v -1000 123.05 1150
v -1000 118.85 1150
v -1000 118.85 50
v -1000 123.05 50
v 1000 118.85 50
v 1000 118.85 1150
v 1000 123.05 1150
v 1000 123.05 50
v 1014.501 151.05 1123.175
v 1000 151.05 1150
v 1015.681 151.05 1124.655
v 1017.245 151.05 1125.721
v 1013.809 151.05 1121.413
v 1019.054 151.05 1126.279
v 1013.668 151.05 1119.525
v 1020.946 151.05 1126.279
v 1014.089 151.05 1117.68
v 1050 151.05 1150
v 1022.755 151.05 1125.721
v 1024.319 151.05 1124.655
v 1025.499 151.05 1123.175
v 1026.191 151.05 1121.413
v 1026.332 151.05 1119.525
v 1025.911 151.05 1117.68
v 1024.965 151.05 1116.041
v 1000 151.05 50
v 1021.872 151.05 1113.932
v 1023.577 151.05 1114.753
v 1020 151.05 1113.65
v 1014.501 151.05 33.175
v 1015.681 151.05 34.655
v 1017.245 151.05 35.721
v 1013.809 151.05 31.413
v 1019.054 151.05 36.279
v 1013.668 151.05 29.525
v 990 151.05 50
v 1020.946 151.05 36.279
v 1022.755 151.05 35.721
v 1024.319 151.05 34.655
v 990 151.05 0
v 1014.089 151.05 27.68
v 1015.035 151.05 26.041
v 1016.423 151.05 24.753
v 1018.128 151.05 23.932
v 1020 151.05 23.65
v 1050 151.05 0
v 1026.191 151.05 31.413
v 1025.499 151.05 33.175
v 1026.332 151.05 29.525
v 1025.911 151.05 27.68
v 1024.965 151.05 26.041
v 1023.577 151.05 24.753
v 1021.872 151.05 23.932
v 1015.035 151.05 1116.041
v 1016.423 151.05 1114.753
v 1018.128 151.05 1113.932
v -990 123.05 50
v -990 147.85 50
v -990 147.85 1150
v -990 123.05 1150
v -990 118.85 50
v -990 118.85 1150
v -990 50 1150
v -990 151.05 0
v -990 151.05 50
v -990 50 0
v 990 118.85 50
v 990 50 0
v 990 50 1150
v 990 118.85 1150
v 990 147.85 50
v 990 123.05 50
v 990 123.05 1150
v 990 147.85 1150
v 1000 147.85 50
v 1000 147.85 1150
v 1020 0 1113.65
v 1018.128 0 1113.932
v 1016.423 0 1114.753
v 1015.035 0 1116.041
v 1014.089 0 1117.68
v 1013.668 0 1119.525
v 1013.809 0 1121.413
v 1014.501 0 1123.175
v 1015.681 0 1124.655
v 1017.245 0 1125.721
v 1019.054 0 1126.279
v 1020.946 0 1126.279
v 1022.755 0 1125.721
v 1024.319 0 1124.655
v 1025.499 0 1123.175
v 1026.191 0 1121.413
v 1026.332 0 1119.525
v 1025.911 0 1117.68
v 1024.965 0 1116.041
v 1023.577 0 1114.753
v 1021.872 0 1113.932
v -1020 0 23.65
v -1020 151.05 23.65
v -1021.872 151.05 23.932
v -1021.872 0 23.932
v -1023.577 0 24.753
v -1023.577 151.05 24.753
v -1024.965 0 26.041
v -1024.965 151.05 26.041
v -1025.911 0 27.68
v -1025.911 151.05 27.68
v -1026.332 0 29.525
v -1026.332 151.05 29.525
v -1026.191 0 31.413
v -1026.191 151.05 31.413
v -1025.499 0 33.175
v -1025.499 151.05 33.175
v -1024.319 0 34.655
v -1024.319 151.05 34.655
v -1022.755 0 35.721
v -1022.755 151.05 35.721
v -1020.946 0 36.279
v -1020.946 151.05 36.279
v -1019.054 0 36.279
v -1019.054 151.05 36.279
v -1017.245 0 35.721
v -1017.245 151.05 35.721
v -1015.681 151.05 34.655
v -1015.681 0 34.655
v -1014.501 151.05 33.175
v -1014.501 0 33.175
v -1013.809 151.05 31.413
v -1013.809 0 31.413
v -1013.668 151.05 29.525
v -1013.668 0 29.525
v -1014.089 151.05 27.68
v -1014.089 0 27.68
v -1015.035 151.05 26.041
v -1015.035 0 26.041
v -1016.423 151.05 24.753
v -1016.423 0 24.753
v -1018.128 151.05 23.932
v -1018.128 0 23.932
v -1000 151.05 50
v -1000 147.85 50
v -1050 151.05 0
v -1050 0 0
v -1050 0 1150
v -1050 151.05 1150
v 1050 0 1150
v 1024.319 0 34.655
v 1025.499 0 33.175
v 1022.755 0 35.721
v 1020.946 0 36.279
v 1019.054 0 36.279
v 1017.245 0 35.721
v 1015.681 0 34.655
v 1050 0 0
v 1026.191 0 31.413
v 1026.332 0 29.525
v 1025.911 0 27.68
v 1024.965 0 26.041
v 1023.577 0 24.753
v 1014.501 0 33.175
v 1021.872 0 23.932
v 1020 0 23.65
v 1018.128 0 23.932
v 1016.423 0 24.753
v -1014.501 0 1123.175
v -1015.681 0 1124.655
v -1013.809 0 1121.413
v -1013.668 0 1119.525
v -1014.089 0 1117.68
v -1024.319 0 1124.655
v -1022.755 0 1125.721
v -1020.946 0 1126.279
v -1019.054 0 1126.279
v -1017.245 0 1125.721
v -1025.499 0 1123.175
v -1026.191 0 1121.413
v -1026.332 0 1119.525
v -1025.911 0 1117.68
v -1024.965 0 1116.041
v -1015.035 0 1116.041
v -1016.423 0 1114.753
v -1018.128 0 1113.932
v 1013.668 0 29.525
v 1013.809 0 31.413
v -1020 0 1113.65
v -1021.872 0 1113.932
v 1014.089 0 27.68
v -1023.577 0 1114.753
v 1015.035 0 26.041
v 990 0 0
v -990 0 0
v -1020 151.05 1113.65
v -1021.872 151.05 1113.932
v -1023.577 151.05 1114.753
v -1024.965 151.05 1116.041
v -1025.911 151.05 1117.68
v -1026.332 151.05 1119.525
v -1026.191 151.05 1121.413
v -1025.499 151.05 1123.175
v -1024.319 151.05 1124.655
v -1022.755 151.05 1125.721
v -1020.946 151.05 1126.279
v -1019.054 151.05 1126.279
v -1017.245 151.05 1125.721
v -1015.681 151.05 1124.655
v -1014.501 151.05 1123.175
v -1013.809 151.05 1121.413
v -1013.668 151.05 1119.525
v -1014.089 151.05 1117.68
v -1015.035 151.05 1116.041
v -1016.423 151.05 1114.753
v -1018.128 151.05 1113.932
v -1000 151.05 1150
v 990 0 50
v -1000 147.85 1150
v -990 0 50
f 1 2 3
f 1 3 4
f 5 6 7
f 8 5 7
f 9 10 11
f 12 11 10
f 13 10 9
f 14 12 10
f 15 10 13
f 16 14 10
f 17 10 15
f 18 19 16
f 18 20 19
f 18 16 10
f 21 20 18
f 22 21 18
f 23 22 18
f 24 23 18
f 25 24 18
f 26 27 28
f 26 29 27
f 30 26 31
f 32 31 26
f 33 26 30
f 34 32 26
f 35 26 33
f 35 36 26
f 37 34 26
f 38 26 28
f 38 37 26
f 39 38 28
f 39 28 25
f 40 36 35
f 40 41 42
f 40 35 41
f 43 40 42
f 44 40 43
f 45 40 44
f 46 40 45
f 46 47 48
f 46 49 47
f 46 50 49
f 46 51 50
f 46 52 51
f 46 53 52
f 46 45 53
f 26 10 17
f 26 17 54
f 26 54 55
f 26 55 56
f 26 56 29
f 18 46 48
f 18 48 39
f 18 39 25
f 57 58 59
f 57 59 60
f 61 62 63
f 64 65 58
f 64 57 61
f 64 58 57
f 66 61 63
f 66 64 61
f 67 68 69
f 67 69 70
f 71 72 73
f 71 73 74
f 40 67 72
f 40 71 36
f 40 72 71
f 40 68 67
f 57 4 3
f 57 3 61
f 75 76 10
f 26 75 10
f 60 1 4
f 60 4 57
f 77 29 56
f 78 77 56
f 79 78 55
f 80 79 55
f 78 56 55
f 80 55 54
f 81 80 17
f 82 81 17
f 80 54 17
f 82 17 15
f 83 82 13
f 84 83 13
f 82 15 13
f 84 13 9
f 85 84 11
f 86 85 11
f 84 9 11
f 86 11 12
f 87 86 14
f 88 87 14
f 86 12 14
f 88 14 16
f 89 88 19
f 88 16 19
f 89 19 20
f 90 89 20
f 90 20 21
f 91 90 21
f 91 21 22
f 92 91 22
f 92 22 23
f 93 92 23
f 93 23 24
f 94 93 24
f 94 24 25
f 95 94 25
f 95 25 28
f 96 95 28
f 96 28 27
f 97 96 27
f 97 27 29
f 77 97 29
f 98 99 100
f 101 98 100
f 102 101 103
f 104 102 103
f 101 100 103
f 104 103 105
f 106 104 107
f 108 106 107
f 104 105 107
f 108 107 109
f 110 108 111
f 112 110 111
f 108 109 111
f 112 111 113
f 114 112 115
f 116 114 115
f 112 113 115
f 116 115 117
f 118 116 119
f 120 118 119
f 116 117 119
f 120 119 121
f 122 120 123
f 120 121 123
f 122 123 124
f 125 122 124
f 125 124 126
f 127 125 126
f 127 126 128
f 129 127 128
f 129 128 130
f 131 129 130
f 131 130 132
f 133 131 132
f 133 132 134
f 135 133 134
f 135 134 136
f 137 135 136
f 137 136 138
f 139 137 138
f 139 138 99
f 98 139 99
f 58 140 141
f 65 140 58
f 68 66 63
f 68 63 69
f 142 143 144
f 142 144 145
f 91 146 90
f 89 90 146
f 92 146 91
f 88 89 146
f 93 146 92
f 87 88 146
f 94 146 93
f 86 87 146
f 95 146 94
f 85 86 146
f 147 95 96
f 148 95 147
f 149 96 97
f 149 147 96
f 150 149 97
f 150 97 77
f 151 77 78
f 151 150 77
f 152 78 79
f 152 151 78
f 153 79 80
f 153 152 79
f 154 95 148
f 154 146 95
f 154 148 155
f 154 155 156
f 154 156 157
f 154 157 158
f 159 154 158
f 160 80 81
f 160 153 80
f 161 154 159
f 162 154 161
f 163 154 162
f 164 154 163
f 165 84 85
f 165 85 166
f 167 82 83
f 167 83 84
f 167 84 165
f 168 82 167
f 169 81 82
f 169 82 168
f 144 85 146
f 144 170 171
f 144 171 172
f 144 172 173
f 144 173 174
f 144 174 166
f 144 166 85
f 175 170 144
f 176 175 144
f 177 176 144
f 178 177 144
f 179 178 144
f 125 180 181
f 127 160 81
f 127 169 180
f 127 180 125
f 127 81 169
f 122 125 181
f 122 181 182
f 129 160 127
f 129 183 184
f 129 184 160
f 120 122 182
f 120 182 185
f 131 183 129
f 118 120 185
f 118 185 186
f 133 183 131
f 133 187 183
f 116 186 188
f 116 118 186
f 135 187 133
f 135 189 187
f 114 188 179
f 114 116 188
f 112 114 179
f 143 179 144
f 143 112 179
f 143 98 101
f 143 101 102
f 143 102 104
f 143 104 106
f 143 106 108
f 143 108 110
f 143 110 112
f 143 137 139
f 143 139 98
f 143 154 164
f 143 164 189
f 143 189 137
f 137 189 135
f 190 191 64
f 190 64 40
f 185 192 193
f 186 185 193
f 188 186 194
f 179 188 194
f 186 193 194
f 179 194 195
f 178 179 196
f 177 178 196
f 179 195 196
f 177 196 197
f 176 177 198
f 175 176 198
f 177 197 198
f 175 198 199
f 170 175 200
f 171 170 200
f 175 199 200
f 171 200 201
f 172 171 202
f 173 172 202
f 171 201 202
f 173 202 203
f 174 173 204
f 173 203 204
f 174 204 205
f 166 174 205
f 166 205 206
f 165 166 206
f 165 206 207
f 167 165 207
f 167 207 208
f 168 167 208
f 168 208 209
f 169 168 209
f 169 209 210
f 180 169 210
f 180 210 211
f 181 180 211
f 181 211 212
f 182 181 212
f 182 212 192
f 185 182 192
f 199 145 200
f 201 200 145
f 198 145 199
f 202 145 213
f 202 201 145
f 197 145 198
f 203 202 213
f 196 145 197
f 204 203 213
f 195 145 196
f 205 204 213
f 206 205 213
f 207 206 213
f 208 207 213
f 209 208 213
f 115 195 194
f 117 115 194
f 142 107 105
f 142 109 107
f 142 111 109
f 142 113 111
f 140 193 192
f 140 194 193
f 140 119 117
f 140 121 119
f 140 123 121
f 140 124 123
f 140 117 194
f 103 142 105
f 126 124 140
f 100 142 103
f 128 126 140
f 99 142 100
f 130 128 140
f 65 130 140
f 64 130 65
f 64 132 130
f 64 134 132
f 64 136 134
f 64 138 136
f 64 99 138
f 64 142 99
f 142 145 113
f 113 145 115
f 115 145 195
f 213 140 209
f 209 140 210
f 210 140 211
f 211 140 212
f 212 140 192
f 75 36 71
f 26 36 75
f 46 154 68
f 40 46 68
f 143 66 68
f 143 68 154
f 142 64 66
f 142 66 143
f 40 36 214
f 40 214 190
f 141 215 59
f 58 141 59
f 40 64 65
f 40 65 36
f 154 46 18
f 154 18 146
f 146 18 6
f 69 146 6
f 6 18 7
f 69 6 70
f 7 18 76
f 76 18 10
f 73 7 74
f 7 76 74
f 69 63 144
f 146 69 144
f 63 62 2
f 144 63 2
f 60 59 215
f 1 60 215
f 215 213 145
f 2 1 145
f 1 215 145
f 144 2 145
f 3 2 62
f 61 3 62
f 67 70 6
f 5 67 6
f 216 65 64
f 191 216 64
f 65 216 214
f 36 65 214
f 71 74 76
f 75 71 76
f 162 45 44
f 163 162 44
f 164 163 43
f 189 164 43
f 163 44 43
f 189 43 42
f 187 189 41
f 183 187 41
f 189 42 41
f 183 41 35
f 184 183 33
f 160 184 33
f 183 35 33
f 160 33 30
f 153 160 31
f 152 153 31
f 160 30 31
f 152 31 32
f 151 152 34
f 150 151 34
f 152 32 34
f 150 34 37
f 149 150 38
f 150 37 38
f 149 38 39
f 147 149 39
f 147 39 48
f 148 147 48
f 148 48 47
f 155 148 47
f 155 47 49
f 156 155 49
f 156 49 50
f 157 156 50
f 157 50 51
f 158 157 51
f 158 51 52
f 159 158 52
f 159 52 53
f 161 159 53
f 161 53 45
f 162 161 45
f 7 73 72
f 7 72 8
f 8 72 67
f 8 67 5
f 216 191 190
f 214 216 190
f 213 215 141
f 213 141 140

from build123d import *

# Parameters (mm, degrees)
BOSS_EXTRUDE1_DEPTH = 1150
SKETCH4_W           = 1980
SKETCH4_H           = 50
BOSS_EXTRUDE2_DEPTH = 151.05
CUT_EXTRUDE2_START  = 1150
SKETCH6_W           = 2000
SKETCH6_H           = 3.2
SKETCH6_H_2         = 4.2
CUT_EXTRUDE2_DEPTH  = 1100
CUT_EXTRUDE3_START  = 151.05
SKETCH7_R           = 6.35
CUT_EXTRUDE3_DEPTH  = 1716.599808252


with BuildPart() as part:
    # Sketch3 → Boss-Extrude1 (new body)
    with BuildSketch(Plane.XY):
        Polygon((-990, 50), (990, 50), (990, 151.05), (1050, 151.05), (1050, 0), (-1050, 0), (-1050, 151.05), (-990, 151.05), align=None)
    extrude(amount=BOSS_EXTRUDE1_DEPTH)

    # Sketch6 → Cut-Extrude2 (cut)
    with BuildSketch(Plane.XY.offset(CUT_EXTRUDE2_START)):
        with Locations((0, 149.45)):
            Rectangle(SKETCH6_W, SKETCH6_H)
        with Locations((0, 120.95)):
            Rectangle(SKETCH6_W, SKETCH6_H_2)
    extrude(amount=-CUT_EXTRUDE2_DEPTH, mode=Mode.SUBTRACT)

    # Sketch7 → Cut-Extrude3 (cut, through all)
    with BuildSketch(Plane(origin=(0, 0, 0), x_dir=(1, 0, 0), z_dir=(0, 1, 0)).offset(CUT_EXTRUDE3_START)):
        with Locations(Location((1020, -30, 0), (0, 0, 90))):
            Circle(SKETCH7_R)
        with Locations(Location((-1020, -30, 0), (0, 0, 90))):
            Circle(SKETCH7_R)
        with Locations(Location((-1020, -1120, 0), (0, 0, 90))):
            Circle(SKETCH7_R)
        with Locations(Location((1020, -1120, 0), (0, 0, 90))):
            Circle(SKETCH7_R)
    extrude(amount=-CUT_EXTRUDE3_DEPTH, mode=Mode.SUBTRACT)


with BuildPart() as body_2:
    # Sketch4 → Boss-Extrude2 (new body)
    with BuildSketch(Plane(origin=(0, 0, 0), x_dir=(1, 0, 0), z_dir=(0, 1, 0))):
        with Locations((0, -25)):
            Rectangle(SKETCH4_W, SKETCH4_H)
    extrude(amount=BOSS_EXTRUDE2_DEPTH)


solid = Compound([part.part, body_2.part])
